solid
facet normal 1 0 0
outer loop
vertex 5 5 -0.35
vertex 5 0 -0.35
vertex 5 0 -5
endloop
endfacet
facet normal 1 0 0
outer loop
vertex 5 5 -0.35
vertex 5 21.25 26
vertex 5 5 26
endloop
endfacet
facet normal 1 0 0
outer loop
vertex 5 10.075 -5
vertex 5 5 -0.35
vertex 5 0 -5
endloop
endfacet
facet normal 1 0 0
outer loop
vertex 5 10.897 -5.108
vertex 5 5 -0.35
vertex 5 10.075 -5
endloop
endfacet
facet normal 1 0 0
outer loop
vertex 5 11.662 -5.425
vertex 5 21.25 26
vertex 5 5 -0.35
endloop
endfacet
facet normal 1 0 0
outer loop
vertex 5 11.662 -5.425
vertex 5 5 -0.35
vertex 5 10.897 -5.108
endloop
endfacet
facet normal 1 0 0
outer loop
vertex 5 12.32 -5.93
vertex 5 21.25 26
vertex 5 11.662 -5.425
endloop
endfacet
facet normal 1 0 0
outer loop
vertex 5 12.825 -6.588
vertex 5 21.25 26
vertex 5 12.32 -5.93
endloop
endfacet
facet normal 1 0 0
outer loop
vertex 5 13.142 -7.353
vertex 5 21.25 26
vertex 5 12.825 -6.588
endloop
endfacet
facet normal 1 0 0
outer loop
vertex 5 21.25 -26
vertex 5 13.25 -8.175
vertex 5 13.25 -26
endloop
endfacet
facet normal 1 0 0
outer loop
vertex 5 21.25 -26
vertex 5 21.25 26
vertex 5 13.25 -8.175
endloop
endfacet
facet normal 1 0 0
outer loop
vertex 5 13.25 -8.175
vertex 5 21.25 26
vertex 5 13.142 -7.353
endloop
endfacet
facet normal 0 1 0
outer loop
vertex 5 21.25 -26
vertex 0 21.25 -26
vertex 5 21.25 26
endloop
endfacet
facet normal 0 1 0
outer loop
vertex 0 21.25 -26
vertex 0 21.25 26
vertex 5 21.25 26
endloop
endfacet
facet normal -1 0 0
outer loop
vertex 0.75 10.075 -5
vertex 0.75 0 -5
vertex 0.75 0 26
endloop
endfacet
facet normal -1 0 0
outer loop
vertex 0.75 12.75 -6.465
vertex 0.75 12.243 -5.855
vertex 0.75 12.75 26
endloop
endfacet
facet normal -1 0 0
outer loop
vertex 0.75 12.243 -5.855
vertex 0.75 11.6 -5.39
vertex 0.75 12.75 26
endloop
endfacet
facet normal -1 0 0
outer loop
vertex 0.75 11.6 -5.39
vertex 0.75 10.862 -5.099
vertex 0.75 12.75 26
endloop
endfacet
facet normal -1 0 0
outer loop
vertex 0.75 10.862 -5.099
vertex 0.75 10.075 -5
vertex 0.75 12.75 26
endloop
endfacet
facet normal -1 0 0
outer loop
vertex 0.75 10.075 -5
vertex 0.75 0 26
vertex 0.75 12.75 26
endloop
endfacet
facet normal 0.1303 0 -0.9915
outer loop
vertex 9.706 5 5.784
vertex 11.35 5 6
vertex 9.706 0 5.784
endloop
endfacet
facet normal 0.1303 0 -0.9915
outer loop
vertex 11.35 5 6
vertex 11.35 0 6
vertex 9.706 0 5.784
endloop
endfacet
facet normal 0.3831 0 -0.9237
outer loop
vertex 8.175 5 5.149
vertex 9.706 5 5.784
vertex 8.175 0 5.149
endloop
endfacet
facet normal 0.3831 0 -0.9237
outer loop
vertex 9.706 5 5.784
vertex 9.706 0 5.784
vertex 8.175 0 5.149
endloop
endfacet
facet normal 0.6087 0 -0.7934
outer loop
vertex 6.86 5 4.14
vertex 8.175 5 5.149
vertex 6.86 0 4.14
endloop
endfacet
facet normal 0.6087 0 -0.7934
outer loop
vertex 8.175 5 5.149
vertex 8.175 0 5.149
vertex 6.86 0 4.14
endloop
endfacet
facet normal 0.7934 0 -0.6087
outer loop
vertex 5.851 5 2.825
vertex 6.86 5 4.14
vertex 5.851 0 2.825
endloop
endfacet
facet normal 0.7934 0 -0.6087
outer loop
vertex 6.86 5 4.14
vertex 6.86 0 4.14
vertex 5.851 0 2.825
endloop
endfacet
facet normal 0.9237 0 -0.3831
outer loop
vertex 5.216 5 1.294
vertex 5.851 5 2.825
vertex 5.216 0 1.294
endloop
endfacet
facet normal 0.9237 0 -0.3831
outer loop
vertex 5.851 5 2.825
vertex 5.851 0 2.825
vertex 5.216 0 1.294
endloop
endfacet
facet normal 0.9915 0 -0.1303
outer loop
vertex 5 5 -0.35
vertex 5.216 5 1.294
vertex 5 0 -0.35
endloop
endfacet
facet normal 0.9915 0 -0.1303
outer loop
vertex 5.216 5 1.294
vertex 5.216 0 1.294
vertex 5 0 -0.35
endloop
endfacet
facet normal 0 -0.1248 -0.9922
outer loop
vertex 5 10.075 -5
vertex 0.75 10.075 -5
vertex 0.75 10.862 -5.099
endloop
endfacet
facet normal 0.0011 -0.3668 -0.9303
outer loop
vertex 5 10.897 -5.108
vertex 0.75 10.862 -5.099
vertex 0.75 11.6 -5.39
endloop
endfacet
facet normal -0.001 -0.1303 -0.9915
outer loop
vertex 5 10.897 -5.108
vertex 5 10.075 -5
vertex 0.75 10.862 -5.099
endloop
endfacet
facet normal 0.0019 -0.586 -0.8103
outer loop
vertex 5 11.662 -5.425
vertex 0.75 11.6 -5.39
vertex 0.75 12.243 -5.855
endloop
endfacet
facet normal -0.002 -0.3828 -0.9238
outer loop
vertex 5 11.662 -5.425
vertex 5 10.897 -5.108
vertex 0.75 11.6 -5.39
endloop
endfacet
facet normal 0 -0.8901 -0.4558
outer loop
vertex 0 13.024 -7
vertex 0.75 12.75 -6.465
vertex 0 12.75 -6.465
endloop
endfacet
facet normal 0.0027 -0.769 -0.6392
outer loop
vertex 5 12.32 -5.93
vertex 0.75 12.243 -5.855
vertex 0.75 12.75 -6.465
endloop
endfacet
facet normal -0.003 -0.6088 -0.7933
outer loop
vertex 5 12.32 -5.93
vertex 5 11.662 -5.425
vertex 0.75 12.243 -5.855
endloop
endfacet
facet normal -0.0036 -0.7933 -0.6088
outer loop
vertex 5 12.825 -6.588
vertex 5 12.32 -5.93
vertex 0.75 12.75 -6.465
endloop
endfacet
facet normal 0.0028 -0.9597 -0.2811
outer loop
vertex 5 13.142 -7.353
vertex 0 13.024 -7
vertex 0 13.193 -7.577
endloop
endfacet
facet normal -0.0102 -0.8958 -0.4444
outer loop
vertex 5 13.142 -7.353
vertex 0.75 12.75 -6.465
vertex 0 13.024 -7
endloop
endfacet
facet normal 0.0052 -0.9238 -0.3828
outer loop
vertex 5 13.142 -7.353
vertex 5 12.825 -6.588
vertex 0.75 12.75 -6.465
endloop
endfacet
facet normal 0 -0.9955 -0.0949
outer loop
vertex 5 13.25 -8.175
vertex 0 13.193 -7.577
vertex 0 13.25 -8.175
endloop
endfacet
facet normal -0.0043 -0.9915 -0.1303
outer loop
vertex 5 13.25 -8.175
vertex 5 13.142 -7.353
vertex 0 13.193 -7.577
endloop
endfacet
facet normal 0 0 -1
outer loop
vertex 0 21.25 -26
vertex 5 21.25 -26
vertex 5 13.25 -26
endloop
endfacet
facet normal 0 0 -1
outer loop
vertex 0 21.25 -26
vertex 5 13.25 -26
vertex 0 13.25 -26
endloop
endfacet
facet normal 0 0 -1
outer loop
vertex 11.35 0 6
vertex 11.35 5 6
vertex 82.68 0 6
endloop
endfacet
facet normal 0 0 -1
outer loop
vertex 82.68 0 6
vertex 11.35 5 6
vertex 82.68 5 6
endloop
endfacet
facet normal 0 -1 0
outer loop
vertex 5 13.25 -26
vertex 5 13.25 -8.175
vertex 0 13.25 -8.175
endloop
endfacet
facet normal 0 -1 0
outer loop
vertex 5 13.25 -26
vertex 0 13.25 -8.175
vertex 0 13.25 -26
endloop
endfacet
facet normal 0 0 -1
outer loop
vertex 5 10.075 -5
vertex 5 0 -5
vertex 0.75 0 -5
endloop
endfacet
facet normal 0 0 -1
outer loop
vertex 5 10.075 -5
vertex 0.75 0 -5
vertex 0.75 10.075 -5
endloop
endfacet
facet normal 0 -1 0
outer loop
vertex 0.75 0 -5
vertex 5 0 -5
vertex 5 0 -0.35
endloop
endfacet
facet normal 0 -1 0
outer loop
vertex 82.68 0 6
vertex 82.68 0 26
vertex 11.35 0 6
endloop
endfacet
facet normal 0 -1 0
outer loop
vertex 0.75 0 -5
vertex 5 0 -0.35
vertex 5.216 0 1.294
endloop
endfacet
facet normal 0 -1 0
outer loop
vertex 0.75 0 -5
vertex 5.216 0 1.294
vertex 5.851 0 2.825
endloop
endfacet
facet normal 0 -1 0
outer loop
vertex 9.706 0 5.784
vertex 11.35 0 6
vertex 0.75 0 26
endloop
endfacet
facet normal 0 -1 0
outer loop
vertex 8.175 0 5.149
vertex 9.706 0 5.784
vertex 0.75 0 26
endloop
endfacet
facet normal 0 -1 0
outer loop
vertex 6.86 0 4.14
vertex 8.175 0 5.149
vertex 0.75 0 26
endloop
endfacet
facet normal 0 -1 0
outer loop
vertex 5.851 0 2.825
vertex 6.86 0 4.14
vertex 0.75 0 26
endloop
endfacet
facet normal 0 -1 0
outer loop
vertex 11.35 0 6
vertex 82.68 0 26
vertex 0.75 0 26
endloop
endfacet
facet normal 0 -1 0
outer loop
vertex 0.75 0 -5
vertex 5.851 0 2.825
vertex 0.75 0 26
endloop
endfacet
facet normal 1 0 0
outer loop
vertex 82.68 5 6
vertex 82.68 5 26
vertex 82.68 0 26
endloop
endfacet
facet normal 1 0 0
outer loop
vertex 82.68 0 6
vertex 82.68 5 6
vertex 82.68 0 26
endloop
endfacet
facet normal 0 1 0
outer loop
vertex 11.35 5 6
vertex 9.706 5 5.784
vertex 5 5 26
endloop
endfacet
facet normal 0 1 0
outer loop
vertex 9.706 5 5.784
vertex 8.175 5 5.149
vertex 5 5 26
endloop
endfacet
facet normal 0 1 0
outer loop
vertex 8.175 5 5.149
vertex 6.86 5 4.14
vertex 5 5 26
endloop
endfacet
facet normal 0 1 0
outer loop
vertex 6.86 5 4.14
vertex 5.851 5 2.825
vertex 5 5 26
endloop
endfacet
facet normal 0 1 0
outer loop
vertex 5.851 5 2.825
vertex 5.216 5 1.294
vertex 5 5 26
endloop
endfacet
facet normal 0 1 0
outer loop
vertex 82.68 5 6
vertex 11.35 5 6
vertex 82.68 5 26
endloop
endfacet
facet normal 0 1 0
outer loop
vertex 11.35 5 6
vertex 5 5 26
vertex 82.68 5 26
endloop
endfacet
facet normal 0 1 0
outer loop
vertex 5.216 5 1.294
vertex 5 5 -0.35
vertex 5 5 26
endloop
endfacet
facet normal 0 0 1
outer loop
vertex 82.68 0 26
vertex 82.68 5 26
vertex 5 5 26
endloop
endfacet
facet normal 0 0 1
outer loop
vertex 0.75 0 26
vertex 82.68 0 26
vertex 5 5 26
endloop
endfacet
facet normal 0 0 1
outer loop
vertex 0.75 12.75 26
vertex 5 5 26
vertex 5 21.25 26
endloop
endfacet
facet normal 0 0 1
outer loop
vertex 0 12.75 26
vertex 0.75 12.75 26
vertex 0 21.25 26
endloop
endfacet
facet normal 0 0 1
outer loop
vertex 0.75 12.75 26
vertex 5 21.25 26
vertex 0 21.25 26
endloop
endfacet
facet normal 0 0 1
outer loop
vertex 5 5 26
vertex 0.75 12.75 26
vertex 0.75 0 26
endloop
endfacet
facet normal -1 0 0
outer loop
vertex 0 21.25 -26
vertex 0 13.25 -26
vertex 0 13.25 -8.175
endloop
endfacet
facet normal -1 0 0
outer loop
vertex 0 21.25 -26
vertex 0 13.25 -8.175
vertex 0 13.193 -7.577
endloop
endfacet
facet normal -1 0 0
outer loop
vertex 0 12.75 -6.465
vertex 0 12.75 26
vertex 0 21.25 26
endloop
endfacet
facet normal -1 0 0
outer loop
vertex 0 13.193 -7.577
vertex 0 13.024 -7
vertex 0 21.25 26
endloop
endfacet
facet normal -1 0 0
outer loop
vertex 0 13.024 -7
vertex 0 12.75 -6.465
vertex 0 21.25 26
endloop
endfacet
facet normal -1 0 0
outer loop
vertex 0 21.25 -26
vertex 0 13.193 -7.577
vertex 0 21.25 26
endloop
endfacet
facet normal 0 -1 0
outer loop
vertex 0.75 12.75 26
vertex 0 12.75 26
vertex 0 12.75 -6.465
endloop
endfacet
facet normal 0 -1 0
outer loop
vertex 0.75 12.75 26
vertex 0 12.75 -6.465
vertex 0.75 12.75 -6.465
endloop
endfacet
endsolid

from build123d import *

# Parameters (mm, degrees)
EXTRUDE1_DEPTH     = 26
SKETCH24_W         = 77.68
SKETCH24_H         = 32
CUT_EXTRUDE1_DEPTH = 89.181885328
FILLET1_R          = 6.35
SKETCH25_W         = 0.75
SKETCH25_H         = 12.75
CUT_EXTRUDE2_DEPTH = 100.95771556
CUT_EXTRUDE5_DEPTH = 85.627093179


with BuildPart() as part:
    # Sketch1 → Extrude1 (new, symmetric)
    with BuildSketch(Plane.XY):
        Polygon((0, 0), (0, 21.25), (5, 21.25), (5, 5), (82.68, 5), (82.68, 0), align=None)
    extrude(amount=EXTRUDE1_DEPTH, both=True)

    # Sketch24 → Cut-Extrude1 (cut, through all)
    with BuildSketch(Plane(origin=(0, 5, 0), x_dir=(1, 0, 0), z_dir=(0, 1, 0))):
        with Locations((43.84, 10)):
            Rectangle(SKETCH24_W, SKETCH24_H)
    extrude(amount=-CUT_EXTRUDE1_DEPTH, mode=Mode.SUBTRACT)

    # Fillet1
    fillet1_edges = [part.edges().sort_by_distance(p)[0] for p in [
        (5, 2.5, 6),
    ]]
    fillet(fillet1_edges, radius=FILLET1_R)

    # Sketch25 → Cut-Extrude2 (cut, through all)
    with BuildSketch(Plane.XY.offset(26)):
        with Locations((0.375, 6.375)):
            Rectangle(SKETCH25_W, SKETCH25_H)
    extrude(amount=-CUT_EXTRUDE2_DEPTH, mode=Mode.SUBTRACT)

    # Sketch30 → Cut-Extrude5 (cut, through all)
    with BuildSketch(Plane(origin=(5, 0, 0), x_dir=(0, 0, -1), z_dir=(1, 0, 0))):
        with BuildLine():
            Line((26, 0), (5, 0))
            Line((5, 0), (5, 10.075))
            ThreePointArc((5, 10.075), (5.92993597, 12.32006403), (8.175, 13.25))
            Line((8.175, 13.25), (26, 13.25))
            Line((26, 13.25), (26, 0))
        make_face()
    extrude(amount=-CUT_EXTRUDE5_DEPTH, mode=Mode.SUBTRACT)


solid = part.part
